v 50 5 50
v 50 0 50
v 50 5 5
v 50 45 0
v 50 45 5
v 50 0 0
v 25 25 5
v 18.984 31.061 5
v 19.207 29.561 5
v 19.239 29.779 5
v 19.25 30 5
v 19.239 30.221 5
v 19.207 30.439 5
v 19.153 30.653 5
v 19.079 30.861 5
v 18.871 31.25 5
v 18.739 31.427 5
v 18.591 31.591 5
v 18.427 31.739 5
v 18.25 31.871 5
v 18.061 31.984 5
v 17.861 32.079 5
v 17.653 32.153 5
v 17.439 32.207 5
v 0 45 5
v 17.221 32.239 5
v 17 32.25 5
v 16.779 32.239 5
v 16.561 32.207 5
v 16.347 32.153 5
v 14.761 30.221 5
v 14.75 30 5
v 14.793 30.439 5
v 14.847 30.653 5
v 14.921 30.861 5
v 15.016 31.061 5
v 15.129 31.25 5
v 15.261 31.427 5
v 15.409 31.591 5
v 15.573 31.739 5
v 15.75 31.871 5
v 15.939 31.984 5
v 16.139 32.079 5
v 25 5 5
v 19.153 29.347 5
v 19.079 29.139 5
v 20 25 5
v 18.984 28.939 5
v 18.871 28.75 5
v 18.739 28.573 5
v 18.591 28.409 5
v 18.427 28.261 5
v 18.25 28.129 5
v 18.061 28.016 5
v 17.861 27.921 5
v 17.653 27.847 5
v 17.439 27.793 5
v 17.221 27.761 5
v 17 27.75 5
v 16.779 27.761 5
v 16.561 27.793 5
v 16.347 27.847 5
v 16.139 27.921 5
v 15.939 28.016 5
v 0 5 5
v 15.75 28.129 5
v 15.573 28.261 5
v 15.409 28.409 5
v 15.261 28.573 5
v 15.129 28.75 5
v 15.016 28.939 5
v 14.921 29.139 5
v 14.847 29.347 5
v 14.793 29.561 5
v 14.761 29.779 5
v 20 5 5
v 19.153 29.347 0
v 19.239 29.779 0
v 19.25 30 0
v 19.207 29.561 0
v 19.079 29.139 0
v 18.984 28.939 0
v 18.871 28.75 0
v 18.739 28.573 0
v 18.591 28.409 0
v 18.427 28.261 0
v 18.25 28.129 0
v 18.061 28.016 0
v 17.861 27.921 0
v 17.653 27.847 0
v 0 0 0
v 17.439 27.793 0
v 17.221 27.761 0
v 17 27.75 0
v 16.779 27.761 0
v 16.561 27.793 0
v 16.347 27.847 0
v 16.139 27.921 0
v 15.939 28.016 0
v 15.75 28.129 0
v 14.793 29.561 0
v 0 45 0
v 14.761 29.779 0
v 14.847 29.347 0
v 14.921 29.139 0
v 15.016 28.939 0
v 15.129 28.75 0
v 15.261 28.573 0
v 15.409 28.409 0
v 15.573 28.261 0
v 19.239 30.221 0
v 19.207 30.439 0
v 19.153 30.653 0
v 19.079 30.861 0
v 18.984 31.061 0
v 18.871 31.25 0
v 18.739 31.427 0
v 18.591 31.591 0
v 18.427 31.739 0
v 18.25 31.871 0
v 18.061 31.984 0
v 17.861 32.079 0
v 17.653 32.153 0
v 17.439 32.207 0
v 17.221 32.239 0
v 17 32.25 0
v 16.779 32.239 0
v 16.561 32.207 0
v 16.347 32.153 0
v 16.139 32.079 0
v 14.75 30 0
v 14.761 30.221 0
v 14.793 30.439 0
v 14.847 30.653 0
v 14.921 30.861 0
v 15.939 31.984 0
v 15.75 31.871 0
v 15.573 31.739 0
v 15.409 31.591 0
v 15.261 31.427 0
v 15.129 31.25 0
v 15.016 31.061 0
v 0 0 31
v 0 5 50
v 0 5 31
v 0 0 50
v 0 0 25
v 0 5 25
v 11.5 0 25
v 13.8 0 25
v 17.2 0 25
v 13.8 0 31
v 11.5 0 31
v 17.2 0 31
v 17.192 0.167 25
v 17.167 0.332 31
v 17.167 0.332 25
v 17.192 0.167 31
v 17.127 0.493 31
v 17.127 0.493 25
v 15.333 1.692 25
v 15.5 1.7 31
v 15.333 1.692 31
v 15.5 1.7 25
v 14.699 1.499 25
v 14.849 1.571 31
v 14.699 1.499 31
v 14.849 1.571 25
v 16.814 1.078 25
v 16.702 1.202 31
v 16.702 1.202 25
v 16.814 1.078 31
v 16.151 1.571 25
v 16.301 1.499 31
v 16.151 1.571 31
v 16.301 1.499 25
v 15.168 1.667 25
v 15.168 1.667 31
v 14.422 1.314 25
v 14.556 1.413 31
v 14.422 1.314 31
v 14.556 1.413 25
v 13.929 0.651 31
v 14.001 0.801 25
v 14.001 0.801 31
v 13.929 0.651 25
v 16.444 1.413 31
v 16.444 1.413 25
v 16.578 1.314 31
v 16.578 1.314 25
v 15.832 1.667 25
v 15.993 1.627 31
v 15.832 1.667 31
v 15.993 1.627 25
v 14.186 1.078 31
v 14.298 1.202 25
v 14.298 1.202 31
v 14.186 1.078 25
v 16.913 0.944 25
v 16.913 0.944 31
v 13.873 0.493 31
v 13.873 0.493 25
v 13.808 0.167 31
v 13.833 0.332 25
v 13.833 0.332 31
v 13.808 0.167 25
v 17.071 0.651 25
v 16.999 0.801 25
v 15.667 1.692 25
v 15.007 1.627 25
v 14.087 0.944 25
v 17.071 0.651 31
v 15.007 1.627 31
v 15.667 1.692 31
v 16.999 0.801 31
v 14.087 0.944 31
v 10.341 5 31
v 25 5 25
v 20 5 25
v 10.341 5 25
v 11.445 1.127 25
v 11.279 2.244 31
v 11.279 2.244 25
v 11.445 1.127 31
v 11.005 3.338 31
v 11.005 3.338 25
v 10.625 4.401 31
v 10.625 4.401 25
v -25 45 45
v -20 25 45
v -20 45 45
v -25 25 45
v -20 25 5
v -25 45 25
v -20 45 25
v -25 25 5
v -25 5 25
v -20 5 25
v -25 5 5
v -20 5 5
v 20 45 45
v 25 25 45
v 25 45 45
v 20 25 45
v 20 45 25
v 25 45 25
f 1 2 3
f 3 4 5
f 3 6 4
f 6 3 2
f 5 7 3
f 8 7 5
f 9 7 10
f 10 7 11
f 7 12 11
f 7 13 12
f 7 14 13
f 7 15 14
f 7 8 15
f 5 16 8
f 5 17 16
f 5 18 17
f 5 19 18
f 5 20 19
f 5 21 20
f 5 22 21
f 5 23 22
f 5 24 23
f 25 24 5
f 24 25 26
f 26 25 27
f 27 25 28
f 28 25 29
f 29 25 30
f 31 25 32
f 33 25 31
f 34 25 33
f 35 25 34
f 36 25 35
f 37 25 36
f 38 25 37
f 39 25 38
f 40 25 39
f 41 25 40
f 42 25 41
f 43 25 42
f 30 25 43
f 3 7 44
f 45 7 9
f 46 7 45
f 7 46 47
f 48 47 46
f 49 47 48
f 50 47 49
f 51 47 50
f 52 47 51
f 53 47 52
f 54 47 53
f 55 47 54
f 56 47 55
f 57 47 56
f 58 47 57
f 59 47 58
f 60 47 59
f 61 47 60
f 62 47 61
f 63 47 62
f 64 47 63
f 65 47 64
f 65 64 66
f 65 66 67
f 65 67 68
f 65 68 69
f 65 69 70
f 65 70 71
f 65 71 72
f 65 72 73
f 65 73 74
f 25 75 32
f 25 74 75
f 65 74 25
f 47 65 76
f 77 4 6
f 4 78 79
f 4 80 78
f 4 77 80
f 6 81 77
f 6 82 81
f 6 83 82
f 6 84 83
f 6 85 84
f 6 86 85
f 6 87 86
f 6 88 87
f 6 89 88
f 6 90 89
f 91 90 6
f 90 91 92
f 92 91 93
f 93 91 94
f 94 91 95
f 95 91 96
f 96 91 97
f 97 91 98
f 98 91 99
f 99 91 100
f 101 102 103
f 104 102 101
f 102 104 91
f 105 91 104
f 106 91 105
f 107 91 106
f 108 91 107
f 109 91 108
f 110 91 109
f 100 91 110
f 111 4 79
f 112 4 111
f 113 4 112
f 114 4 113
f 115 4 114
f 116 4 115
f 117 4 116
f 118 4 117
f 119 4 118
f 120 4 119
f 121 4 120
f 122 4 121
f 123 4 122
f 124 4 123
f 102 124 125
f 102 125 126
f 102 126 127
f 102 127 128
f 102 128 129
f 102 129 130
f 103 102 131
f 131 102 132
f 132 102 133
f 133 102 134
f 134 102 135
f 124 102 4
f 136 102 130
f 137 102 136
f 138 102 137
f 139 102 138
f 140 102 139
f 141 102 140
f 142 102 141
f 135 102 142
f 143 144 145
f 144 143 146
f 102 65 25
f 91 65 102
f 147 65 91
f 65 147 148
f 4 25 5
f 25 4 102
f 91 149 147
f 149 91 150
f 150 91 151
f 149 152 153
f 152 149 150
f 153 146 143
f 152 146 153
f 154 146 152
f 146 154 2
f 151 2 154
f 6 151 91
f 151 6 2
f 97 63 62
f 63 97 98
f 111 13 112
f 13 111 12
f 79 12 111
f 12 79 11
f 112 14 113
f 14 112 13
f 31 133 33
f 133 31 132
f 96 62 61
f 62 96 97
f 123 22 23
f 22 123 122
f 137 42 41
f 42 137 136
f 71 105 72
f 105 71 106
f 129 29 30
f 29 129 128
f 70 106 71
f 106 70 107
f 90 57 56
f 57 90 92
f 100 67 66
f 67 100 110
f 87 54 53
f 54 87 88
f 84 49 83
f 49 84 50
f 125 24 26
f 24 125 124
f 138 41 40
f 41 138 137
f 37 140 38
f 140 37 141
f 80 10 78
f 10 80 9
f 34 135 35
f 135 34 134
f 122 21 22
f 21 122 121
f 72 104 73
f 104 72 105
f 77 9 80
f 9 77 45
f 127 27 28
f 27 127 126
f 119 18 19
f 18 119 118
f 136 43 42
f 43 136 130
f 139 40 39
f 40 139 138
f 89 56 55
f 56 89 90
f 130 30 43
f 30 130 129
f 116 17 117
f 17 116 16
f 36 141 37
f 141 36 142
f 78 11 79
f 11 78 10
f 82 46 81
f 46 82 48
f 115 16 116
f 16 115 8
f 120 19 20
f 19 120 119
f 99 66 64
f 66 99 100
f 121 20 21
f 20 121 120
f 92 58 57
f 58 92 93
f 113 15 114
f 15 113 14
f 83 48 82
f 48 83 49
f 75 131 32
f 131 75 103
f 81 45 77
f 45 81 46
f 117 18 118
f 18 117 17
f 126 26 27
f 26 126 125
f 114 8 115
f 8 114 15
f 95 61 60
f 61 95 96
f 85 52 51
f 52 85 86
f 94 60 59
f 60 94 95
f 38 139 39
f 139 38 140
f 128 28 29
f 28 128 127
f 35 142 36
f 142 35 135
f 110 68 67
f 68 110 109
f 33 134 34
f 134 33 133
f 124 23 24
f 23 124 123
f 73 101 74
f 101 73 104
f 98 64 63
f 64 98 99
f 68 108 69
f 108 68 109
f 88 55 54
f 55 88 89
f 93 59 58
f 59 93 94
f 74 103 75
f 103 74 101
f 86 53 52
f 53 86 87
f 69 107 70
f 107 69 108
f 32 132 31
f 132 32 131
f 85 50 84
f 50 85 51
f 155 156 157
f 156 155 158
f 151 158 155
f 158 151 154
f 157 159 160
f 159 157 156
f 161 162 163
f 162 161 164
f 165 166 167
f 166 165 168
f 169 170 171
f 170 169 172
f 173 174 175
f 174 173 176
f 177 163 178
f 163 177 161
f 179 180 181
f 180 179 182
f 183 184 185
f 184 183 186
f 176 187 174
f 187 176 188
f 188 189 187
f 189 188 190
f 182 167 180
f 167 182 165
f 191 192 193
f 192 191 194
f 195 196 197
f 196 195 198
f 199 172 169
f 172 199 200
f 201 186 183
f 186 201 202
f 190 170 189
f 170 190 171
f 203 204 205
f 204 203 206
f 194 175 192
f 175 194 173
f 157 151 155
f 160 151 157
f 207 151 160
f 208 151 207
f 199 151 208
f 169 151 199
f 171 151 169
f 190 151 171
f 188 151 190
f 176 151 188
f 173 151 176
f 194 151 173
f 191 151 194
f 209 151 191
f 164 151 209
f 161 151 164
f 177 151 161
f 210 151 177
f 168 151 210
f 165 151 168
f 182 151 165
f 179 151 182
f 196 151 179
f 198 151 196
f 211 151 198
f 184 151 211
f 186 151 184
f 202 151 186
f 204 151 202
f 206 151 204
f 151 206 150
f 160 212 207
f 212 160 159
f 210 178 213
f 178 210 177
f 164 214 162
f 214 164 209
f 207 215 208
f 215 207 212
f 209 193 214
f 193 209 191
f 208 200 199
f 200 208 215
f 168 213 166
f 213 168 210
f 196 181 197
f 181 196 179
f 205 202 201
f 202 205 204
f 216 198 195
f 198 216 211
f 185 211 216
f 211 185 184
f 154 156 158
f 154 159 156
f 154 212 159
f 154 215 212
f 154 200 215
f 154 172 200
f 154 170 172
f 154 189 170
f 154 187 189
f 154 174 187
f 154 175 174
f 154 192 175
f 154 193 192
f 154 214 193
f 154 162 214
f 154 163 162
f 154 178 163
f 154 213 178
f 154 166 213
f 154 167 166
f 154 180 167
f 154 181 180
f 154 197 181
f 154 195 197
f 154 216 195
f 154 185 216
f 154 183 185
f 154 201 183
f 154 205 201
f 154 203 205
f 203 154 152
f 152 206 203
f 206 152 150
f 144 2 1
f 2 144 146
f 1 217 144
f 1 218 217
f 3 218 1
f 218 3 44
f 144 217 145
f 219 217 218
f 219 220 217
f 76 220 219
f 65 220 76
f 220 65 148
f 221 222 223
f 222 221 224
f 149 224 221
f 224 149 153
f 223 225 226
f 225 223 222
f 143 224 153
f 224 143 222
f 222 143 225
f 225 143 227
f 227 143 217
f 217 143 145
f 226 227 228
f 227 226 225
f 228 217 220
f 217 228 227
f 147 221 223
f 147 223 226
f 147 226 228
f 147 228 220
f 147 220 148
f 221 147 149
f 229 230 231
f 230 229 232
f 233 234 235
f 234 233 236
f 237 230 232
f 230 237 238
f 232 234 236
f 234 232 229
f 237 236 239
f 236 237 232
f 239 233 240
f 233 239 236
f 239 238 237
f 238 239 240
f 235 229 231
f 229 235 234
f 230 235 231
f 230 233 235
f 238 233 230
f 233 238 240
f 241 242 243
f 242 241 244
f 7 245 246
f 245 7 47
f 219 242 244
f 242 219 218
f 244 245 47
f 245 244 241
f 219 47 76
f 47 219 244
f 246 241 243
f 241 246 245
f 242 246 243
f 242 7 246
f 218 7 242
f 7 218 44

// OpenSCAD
// L-shaped mounting bracket for NEMA 17 stepper motor
// Print orientation: base plate on bed (z = 0), builds upward

// Dimensions
base_x_min = -25;
base_x_max = 25;
base_y_min = 0;
base_y_max = 45;
base_z = 5;

motor_plate_x_min = -25;
motor_plate_x_max = 25;
motor_plate_y_min = 0;
motor_plate_y_max = 5;
motor_plate_z = 50;

// Hole positions and sizes
m4_hole_diameter = 4.5;
m4_hole_x1 = -17;
m4_hole_x2 = 17;
m4_hole_y = 30;

boss_hole_diameter = 23;
boss_hole_center_x = 0;
boss_hole_center_z = 28;

m3_hole_diameter = 3.4;
m3_hole_spacing = 31;
m3_hole_offset = m3_hole_spacing / 2;

// Gussets
gusset_thickness = 5;
gusset_leg_length = 20;
gusset_y_start = 5;
gusset_z_start = 5;

// Set resolution for smooth curves
$fn = 64;

// Main module
module mounting_bracket() {
    // Base plate: x from -25 to 25, y from 0 to 45, z from 0 to 5
    difference() {
        cube([base_x_max - base_x_min, base_y_max - base_y_min, base_z], center = false);
        translate([m4_hole_x1, m4_hole_y, base_z/2]) cylinder(h = base_z + 1, r = m4_hole_diameter/2, center = true);
        translate([m4_hole_x2, m4_hole_y, base_z/2]) cylinder(h = base_z + 1, r = m4_hole_diameter/2, center = true);
    }

    // Motor plate: x from -25 to 25, y from 0 to 5, z from 0 to 50
    // Positioned at y = 0 to 5, z = 0 to 50, attached to base at y = 0 to 5, z = 0 to 5
    difference() {
        translate([0, 0, 0]) cube([motor_plate_x_max - motor_plate_x_min, motor_plate_y_max - motor_plate_y_min, motor_plate_z], center = false);
        // Cut boss hole through motor plate (along Y)
        translate([boss_hole_center_x, 0, boss_hole_center_z]) cylinder(h = motor_plate_y_max + 1, r = boss_hole_diameter/2, center = true);
        // Cut M3 screw holes (4 holes on 31mm square)
        for (i = [0:1]) {
            for (j = [0:1]) {
                x_offset = -m3_hole_offset + i * m3_hole_spacing;
                y_offset = -m3_hole_offset + j * m3_hole_spacing;
                translate([x_offset, 0, boss_hole_center_z]) cylinder(h = motor_plate_y_max + 1, r = m3_hole_diameter/2, center = true);
            }
        }
    }

    // Gussets: right triangles in YZ plane, legs 20mm along Y and Z, right angle at (y=5, z=5)
    // Left gusset: x = -25 to -20, y = 5 to 25, z = 5 to 25
    translate([base_x_min, gusset_y_start, gusset_z_start]) {
        hull() {
            translate([0, 0, 0]) cube([gusset_thickness, gusset_leg_length, gusset_leg_length], center = false);
            translate([0, gusset_leg_length, gusset_leg_length]) cube([gusset_thickness, gusset_leg_length, gusset_leg_length], center = false);
        }
    }

    // Right gusset: x = 20 to 25, y = 5 to 25, z = 5 to 25
    translate([base_x_max - gusset_thickness, gusset_y_start, gusset_z_start]) {
        hull() {
            translate([0, 0, 0]) cube([gusset_thickness, gusset_leg_length, gusset_leg_length], center = false);
            translate([0, gusset_leg_length, gusset_leg_length]) cube([gusset_thickness, gusset_leg_length, gusset_leg_length], center = false);
        }
    }
}

// Render the bracket
mounting_bracket();
